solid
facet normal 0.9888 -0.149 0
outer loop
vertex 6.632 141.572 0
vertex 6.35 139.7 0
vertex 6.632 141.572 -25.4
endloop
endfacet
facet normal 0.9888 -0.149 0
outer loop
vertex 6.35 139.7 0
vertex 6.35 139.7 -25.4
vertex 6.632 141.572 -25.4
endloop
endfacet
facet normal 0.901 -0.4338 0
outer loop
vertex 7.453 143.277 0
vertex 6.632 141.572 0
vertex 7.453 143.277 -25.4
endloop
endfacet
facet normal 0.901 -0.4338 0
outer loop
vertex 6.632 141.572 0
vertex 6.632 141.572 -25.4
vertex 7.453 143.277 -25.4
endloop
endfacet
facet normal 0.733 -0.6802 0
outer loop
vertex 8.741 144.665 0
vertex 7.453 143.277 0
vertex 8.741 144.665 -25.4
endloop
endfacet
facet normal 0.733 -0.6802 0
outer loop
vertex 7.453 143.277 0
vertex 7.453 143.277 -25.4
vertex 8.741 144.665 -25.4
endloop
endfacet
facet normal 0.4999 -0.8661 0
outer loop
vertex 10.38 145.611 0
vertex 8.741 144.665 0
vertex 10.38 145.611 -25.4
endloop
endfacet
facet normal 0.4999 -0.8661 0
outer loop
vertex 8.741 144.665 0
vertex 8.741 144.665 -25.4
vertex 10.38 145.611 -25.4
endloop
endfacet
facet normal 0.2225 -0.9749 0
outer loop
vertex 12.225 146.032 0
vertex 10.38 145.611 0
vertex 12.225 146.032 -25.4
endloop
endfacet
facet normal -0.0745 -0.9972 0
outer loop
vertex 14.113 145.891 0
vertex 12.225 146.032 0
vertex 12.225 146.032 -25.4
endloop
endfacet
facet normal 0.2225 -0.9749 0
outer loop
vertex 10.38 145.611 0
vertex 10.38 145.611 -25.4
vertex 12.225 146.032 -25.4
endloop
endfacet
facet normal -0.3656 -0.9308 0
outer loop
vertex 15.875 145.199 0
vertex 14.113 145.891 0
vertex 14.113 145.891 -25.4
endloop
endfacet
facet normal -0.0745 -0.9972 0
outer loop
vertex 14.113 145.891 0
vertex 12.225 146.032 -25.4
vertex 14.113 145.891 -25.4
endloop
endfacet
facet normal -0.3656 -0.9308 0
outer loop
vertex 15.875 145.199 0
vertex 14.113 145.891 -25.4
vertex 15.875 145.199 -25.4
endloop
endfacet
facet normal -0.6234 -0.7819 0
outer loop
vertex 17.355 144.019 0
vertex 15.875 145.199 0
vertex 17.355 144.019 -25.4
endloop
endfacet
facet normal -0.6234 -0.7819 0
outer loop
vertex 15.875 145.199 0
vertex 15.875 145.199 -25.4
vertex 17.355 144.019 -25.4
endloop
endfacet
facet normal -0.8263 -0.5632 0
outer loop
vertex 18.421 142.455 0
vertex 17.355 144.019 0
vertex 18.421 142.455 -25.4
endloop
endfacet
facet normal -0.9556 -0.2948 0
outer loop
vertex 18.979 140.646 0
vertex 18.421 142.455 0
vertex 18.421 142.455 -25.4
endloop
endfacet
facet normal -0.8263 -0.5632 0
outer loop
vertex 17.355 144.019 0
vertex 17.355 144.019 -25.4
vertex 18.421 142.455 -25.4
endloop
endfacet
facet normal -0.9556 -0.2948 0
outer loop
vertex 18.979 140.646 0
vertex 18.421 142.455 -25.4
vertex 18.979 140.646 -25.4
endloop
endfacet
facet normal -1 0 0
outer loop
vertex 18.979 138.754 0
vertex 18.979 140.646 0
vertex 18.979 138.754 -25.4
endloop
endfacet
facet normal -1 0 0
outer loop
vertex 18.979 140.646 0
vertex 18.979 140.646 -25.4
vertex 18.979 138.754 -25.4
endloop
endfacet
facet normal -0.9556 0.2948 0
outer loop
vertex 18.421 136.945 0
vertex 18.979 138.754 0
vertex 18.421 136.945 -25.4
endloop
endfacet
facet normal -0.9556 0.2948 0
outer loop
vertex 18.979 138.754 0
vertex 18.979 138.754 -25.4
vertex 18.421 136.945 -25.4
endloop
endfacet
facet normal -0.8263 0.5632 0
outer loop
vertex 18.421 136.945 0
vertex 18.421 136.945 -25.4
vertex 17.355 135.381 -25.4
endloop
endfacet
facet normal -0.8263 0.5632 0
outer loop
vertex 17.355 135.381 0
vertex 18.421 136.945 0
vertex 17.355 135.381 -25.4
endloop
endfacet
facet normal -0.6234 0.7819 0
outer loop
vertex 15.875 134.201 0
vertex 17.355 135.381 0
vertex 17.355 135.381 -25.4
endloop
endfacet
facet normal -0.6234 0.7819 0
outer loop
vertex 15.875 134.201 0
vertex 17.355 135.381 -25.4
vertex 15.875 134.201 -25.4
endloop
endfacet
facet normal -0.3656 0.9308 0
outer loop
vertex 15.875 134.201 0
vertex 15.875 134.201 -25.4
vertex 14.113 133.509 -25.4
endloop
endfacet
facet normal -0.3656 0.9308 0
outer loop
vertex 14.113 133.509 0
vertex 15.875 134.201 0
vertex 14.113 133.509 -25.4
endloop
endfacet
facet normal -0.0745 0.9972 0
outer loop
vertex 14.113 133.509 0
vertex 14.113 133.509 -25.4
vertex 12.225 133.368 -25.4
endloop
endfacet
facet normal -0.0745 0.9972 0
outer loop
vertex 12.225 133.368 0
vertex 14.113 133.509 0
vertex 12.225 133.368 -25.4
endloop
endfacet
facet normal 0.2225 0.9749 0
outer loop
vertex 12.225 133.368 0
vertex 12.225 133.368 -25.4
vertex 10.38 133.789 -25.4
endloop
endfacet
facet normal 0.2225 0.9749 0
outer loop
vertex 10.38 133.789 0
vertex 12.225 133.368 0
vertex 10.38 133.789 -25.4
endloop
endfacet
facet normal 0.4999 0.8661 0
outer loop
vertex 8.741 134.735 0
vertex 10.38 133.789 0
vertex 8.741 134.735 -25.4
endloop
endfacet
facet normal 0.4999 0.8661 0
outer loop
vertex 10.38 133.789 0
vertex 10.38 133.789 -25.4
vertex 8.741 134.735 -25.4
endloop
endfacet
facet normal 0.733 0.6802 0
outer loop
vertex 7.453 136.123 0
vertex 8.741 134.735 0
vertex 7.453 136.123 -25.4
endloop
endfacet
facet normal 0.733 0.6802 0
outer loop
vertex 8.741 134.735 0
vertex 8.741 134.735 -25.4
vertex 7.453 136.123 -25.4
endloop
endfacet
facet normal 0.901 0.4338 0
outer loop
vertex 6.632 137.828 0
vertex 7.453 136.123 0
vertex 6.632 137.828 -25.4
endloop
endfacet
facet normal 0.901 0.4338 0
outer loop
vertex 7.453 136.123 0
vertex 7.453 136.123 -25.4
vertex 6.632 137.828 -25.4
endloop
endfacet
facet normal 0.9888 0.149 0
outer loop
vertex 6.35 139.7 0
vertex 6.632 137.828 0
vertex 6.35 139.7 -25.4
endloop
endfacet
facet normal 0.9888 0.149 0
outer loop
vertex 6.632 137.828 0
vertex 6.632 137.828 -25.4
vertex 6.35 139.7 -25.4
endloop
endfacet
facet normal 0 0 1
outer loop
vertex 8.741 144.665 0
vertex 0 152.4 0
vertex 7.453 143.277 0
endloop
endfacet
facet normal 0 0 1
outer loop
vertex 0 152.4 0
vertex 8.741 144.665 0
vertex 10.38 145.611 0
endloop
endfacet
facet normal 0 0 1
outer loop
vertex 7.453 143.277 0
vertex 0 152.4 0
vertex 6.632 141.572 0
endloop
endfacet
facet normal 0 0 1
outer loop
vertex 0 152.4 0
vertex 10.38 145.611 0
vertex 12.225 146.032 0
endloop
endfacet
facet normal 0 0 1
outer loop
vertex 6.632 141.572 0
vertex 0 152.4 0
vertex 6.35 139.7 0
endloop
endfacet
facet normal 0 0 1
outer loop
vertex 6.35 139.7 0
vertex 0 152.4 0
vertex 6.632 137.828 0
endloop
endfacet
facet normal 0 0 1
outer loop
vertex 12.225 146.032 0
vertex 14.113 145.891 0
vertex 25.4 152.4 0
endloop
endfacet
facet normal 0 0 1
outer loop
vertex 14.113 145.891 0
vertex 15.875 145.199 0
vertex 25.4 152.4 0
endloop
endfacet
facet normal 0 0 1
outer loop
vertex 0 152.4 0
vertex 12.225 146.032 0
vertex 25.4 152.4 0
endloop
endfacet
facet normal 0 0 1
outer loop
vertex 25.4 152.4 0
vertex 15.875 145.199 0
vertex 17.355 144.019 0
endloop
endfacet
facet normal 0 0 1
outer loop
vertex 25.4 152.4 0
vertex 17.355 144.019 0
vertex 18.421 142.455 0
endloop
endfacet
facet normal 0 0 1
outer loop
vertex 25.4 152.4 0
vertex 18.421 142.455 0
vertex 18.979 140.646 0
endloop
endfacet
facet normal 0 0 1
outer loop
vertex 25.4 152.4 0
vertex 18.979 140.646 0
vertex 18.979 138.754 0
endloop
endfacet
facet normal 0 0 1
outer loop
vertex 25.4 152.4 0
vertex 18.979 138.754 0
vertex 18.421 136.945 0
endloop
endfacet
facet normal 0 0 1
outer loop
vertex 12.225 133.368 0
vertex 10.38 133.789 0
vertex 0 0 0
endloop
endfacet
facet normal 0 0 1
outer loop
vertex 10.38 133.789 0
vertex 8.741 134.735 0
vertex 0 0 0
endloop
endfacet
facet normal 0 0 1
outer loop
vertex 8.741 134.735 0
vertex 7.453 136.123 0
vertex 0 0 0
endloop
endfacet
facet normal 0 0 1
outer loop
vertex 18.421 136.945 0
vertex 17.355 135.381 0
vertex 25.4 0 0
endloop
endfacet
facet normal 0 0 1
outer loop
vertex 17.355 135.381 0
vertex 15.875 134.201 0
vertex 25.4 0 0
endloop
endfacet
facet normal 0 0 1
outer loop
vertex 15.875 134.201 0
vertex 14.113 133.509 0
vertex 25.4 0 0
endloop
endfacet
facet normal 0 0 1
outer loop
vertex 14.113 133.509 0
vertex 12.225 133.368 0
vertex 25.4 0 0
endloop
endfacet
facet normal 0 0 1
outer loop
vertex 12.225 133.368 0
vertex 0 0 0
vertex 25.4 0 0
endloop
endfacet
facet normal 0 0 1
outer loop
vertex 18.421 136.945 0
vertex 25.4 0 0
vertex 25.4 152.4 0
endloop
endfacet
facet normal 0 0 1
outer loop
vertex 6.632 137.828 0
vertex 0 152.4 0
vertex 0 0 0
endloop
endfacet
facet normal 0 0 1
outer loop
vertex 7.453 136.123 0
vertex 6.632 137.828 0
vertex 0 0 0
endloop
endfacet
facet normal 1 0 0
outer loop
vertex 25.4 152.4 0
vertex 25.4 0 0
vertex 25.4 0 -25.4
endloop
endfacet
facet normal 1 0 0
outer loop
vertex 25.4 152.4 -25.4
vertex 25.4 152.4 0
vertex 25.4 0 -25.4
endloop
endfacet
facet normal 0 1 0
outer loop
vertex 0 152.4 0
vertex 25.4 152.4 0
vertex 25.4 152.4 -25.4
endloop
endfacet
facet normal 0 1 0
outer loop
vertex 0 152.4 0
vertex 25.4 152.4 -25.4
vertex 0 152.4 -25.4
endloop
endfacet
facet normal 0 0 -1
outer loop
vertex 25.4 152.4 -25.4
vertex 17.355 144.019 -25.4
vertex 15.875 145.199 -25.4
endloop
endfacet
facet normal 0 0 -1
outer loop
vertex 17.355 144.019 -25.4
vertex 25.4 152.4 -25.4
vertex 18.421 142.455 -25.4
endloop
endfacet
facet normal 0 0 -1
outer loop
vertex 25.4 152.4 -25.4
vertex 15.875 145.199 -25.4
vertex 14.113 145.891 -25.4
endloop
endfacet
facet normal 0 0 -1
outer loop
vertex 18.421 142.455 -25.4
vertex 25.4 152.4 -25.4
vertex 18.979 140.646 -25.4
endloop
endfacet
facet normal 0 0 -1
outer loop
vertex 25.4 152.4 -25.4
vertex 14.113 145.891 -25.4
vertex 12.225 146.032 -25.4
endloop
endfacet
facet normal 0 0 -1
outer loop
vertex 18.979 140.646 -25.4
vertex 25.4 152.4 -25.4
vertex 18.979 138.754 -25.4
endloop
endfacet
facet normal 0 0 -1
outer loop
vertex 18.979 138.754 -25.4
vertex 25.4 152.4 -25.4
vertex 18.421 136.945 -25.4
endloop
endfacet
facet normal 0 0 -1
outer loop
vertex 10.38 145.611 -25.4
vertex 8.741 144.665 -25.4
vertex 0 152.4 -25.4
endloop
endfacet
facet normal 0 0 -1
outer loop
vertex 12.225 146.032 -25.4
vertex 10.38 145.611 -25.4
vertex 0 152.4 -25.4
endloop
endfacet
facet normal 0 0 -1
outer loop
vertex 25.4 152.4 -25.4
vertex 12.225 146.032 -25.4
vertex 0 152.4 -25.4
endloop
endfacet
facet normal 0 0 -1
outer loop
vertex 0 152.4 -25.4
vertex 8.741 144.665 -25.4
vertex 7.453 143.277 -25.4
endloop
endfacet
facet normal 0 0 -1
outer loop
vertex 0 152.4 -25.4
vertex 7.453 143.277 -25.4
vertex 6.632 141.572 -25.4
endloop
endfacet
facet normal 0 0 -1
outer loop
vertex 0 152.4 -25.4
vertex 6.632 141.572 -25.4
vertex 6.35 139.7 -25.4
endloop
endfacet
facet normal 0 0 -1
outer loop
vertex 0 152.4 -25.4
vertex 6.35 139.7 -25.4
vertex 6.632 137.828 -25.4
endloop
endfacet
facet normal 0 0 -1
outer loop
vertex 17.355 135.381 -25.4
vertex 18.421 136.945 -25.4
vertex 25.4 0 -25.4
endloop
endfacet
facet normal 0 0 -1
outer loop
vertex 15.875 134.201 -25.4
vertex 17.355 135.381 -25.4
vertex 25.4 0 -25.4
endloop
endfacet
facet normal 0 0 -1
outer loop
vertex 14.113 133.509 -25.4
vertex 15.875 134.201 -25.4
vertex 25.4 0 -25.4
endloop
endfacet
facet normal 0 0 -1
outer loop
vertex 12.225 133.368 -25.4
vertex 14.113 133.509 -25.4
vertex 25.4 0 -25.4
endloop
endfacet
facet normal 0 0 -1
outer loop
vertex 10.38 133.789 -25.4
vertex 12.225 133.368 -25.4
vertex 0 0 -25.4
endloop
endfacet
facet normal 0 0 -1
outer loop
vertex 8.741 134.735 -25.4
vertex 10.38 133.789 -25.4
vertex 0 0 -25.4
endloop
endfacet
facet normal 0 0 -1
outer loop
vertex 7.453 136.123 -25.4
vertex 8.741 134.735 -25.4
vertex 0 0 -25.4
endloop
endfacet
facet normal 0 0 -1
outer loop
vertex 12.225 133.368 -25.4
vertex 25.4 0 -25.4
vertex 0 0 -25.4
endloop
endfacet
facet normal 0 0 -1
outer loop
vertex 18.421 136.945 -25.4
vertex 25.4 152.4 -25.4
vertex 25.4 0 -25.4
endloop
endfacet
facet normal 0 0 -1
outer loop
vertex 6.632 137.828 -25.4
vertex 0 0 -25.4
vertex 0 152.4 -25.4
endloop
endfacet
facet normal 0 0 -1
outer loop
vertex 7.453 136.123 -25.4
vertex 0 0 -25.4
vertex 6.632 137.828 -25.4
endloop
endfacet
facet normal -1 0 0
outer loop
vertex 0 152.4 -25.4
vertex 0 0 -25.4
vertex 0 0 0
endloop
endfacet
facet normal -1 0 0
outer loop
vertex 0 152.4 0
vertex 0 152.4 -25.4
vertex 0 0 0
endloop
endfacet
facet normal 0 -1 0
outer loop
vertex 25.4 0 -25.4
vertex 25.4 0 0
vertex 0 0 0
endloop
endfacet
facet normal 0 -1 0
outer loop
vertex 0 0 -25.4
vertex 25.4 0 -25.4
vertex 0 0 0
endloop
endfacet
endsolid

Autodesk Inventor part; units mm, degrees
ref_plane "YZ Plane" through (0, 0, 0) normal (1, 0, 0) x (0, 1, 0)
ref_plane "XZ Plane" through (0, 0, 0) normal (0, 1, 0) x (-1, 0, 0)
ref_plane "XY Plane" through (0, 0, 0) normal (0, 0, 1) x (1, 0, 0)
sketch "Sketch1" plane through (0, 0, 0) normal (0, 1, 0) x (-1, 0, 0)
  line L0 (0, 0) -> (-25.4, 0)
  line L1 (-25.4, 0) -> (-25.4, -25.4)
  line L2 (-25.4, -25.4) -> (0, -25.4)
  line L3 (0, -25.4) -> (0, 0)
  dimension "d0" = 25.4
  dimension "d1" = 25.4
extrude "Extrusion1" add sketch "Sketch1" along normal blind 152.4
sketch "Sketch2" plane through (25.4, 0, -25.4) normal (0, 0, -1) x (-1, 0, 0)
  circle A0 centre (12.7, 139.7) radius 6.35
  line L0 (0, 0) -> (0, 152.4) projected
  line L1 (0, 152.4) -> (25.4, 152.4) projected
  point P0 (25.4, 0)
  dimension "d4" = 12.7
  dimension "d5" = 12.7
  dimension "d6" = 12.7
extrude "Extrusion2" cut sketch "Sketch2" against normal blind 152.4
properties material "Aluminum 6061"
